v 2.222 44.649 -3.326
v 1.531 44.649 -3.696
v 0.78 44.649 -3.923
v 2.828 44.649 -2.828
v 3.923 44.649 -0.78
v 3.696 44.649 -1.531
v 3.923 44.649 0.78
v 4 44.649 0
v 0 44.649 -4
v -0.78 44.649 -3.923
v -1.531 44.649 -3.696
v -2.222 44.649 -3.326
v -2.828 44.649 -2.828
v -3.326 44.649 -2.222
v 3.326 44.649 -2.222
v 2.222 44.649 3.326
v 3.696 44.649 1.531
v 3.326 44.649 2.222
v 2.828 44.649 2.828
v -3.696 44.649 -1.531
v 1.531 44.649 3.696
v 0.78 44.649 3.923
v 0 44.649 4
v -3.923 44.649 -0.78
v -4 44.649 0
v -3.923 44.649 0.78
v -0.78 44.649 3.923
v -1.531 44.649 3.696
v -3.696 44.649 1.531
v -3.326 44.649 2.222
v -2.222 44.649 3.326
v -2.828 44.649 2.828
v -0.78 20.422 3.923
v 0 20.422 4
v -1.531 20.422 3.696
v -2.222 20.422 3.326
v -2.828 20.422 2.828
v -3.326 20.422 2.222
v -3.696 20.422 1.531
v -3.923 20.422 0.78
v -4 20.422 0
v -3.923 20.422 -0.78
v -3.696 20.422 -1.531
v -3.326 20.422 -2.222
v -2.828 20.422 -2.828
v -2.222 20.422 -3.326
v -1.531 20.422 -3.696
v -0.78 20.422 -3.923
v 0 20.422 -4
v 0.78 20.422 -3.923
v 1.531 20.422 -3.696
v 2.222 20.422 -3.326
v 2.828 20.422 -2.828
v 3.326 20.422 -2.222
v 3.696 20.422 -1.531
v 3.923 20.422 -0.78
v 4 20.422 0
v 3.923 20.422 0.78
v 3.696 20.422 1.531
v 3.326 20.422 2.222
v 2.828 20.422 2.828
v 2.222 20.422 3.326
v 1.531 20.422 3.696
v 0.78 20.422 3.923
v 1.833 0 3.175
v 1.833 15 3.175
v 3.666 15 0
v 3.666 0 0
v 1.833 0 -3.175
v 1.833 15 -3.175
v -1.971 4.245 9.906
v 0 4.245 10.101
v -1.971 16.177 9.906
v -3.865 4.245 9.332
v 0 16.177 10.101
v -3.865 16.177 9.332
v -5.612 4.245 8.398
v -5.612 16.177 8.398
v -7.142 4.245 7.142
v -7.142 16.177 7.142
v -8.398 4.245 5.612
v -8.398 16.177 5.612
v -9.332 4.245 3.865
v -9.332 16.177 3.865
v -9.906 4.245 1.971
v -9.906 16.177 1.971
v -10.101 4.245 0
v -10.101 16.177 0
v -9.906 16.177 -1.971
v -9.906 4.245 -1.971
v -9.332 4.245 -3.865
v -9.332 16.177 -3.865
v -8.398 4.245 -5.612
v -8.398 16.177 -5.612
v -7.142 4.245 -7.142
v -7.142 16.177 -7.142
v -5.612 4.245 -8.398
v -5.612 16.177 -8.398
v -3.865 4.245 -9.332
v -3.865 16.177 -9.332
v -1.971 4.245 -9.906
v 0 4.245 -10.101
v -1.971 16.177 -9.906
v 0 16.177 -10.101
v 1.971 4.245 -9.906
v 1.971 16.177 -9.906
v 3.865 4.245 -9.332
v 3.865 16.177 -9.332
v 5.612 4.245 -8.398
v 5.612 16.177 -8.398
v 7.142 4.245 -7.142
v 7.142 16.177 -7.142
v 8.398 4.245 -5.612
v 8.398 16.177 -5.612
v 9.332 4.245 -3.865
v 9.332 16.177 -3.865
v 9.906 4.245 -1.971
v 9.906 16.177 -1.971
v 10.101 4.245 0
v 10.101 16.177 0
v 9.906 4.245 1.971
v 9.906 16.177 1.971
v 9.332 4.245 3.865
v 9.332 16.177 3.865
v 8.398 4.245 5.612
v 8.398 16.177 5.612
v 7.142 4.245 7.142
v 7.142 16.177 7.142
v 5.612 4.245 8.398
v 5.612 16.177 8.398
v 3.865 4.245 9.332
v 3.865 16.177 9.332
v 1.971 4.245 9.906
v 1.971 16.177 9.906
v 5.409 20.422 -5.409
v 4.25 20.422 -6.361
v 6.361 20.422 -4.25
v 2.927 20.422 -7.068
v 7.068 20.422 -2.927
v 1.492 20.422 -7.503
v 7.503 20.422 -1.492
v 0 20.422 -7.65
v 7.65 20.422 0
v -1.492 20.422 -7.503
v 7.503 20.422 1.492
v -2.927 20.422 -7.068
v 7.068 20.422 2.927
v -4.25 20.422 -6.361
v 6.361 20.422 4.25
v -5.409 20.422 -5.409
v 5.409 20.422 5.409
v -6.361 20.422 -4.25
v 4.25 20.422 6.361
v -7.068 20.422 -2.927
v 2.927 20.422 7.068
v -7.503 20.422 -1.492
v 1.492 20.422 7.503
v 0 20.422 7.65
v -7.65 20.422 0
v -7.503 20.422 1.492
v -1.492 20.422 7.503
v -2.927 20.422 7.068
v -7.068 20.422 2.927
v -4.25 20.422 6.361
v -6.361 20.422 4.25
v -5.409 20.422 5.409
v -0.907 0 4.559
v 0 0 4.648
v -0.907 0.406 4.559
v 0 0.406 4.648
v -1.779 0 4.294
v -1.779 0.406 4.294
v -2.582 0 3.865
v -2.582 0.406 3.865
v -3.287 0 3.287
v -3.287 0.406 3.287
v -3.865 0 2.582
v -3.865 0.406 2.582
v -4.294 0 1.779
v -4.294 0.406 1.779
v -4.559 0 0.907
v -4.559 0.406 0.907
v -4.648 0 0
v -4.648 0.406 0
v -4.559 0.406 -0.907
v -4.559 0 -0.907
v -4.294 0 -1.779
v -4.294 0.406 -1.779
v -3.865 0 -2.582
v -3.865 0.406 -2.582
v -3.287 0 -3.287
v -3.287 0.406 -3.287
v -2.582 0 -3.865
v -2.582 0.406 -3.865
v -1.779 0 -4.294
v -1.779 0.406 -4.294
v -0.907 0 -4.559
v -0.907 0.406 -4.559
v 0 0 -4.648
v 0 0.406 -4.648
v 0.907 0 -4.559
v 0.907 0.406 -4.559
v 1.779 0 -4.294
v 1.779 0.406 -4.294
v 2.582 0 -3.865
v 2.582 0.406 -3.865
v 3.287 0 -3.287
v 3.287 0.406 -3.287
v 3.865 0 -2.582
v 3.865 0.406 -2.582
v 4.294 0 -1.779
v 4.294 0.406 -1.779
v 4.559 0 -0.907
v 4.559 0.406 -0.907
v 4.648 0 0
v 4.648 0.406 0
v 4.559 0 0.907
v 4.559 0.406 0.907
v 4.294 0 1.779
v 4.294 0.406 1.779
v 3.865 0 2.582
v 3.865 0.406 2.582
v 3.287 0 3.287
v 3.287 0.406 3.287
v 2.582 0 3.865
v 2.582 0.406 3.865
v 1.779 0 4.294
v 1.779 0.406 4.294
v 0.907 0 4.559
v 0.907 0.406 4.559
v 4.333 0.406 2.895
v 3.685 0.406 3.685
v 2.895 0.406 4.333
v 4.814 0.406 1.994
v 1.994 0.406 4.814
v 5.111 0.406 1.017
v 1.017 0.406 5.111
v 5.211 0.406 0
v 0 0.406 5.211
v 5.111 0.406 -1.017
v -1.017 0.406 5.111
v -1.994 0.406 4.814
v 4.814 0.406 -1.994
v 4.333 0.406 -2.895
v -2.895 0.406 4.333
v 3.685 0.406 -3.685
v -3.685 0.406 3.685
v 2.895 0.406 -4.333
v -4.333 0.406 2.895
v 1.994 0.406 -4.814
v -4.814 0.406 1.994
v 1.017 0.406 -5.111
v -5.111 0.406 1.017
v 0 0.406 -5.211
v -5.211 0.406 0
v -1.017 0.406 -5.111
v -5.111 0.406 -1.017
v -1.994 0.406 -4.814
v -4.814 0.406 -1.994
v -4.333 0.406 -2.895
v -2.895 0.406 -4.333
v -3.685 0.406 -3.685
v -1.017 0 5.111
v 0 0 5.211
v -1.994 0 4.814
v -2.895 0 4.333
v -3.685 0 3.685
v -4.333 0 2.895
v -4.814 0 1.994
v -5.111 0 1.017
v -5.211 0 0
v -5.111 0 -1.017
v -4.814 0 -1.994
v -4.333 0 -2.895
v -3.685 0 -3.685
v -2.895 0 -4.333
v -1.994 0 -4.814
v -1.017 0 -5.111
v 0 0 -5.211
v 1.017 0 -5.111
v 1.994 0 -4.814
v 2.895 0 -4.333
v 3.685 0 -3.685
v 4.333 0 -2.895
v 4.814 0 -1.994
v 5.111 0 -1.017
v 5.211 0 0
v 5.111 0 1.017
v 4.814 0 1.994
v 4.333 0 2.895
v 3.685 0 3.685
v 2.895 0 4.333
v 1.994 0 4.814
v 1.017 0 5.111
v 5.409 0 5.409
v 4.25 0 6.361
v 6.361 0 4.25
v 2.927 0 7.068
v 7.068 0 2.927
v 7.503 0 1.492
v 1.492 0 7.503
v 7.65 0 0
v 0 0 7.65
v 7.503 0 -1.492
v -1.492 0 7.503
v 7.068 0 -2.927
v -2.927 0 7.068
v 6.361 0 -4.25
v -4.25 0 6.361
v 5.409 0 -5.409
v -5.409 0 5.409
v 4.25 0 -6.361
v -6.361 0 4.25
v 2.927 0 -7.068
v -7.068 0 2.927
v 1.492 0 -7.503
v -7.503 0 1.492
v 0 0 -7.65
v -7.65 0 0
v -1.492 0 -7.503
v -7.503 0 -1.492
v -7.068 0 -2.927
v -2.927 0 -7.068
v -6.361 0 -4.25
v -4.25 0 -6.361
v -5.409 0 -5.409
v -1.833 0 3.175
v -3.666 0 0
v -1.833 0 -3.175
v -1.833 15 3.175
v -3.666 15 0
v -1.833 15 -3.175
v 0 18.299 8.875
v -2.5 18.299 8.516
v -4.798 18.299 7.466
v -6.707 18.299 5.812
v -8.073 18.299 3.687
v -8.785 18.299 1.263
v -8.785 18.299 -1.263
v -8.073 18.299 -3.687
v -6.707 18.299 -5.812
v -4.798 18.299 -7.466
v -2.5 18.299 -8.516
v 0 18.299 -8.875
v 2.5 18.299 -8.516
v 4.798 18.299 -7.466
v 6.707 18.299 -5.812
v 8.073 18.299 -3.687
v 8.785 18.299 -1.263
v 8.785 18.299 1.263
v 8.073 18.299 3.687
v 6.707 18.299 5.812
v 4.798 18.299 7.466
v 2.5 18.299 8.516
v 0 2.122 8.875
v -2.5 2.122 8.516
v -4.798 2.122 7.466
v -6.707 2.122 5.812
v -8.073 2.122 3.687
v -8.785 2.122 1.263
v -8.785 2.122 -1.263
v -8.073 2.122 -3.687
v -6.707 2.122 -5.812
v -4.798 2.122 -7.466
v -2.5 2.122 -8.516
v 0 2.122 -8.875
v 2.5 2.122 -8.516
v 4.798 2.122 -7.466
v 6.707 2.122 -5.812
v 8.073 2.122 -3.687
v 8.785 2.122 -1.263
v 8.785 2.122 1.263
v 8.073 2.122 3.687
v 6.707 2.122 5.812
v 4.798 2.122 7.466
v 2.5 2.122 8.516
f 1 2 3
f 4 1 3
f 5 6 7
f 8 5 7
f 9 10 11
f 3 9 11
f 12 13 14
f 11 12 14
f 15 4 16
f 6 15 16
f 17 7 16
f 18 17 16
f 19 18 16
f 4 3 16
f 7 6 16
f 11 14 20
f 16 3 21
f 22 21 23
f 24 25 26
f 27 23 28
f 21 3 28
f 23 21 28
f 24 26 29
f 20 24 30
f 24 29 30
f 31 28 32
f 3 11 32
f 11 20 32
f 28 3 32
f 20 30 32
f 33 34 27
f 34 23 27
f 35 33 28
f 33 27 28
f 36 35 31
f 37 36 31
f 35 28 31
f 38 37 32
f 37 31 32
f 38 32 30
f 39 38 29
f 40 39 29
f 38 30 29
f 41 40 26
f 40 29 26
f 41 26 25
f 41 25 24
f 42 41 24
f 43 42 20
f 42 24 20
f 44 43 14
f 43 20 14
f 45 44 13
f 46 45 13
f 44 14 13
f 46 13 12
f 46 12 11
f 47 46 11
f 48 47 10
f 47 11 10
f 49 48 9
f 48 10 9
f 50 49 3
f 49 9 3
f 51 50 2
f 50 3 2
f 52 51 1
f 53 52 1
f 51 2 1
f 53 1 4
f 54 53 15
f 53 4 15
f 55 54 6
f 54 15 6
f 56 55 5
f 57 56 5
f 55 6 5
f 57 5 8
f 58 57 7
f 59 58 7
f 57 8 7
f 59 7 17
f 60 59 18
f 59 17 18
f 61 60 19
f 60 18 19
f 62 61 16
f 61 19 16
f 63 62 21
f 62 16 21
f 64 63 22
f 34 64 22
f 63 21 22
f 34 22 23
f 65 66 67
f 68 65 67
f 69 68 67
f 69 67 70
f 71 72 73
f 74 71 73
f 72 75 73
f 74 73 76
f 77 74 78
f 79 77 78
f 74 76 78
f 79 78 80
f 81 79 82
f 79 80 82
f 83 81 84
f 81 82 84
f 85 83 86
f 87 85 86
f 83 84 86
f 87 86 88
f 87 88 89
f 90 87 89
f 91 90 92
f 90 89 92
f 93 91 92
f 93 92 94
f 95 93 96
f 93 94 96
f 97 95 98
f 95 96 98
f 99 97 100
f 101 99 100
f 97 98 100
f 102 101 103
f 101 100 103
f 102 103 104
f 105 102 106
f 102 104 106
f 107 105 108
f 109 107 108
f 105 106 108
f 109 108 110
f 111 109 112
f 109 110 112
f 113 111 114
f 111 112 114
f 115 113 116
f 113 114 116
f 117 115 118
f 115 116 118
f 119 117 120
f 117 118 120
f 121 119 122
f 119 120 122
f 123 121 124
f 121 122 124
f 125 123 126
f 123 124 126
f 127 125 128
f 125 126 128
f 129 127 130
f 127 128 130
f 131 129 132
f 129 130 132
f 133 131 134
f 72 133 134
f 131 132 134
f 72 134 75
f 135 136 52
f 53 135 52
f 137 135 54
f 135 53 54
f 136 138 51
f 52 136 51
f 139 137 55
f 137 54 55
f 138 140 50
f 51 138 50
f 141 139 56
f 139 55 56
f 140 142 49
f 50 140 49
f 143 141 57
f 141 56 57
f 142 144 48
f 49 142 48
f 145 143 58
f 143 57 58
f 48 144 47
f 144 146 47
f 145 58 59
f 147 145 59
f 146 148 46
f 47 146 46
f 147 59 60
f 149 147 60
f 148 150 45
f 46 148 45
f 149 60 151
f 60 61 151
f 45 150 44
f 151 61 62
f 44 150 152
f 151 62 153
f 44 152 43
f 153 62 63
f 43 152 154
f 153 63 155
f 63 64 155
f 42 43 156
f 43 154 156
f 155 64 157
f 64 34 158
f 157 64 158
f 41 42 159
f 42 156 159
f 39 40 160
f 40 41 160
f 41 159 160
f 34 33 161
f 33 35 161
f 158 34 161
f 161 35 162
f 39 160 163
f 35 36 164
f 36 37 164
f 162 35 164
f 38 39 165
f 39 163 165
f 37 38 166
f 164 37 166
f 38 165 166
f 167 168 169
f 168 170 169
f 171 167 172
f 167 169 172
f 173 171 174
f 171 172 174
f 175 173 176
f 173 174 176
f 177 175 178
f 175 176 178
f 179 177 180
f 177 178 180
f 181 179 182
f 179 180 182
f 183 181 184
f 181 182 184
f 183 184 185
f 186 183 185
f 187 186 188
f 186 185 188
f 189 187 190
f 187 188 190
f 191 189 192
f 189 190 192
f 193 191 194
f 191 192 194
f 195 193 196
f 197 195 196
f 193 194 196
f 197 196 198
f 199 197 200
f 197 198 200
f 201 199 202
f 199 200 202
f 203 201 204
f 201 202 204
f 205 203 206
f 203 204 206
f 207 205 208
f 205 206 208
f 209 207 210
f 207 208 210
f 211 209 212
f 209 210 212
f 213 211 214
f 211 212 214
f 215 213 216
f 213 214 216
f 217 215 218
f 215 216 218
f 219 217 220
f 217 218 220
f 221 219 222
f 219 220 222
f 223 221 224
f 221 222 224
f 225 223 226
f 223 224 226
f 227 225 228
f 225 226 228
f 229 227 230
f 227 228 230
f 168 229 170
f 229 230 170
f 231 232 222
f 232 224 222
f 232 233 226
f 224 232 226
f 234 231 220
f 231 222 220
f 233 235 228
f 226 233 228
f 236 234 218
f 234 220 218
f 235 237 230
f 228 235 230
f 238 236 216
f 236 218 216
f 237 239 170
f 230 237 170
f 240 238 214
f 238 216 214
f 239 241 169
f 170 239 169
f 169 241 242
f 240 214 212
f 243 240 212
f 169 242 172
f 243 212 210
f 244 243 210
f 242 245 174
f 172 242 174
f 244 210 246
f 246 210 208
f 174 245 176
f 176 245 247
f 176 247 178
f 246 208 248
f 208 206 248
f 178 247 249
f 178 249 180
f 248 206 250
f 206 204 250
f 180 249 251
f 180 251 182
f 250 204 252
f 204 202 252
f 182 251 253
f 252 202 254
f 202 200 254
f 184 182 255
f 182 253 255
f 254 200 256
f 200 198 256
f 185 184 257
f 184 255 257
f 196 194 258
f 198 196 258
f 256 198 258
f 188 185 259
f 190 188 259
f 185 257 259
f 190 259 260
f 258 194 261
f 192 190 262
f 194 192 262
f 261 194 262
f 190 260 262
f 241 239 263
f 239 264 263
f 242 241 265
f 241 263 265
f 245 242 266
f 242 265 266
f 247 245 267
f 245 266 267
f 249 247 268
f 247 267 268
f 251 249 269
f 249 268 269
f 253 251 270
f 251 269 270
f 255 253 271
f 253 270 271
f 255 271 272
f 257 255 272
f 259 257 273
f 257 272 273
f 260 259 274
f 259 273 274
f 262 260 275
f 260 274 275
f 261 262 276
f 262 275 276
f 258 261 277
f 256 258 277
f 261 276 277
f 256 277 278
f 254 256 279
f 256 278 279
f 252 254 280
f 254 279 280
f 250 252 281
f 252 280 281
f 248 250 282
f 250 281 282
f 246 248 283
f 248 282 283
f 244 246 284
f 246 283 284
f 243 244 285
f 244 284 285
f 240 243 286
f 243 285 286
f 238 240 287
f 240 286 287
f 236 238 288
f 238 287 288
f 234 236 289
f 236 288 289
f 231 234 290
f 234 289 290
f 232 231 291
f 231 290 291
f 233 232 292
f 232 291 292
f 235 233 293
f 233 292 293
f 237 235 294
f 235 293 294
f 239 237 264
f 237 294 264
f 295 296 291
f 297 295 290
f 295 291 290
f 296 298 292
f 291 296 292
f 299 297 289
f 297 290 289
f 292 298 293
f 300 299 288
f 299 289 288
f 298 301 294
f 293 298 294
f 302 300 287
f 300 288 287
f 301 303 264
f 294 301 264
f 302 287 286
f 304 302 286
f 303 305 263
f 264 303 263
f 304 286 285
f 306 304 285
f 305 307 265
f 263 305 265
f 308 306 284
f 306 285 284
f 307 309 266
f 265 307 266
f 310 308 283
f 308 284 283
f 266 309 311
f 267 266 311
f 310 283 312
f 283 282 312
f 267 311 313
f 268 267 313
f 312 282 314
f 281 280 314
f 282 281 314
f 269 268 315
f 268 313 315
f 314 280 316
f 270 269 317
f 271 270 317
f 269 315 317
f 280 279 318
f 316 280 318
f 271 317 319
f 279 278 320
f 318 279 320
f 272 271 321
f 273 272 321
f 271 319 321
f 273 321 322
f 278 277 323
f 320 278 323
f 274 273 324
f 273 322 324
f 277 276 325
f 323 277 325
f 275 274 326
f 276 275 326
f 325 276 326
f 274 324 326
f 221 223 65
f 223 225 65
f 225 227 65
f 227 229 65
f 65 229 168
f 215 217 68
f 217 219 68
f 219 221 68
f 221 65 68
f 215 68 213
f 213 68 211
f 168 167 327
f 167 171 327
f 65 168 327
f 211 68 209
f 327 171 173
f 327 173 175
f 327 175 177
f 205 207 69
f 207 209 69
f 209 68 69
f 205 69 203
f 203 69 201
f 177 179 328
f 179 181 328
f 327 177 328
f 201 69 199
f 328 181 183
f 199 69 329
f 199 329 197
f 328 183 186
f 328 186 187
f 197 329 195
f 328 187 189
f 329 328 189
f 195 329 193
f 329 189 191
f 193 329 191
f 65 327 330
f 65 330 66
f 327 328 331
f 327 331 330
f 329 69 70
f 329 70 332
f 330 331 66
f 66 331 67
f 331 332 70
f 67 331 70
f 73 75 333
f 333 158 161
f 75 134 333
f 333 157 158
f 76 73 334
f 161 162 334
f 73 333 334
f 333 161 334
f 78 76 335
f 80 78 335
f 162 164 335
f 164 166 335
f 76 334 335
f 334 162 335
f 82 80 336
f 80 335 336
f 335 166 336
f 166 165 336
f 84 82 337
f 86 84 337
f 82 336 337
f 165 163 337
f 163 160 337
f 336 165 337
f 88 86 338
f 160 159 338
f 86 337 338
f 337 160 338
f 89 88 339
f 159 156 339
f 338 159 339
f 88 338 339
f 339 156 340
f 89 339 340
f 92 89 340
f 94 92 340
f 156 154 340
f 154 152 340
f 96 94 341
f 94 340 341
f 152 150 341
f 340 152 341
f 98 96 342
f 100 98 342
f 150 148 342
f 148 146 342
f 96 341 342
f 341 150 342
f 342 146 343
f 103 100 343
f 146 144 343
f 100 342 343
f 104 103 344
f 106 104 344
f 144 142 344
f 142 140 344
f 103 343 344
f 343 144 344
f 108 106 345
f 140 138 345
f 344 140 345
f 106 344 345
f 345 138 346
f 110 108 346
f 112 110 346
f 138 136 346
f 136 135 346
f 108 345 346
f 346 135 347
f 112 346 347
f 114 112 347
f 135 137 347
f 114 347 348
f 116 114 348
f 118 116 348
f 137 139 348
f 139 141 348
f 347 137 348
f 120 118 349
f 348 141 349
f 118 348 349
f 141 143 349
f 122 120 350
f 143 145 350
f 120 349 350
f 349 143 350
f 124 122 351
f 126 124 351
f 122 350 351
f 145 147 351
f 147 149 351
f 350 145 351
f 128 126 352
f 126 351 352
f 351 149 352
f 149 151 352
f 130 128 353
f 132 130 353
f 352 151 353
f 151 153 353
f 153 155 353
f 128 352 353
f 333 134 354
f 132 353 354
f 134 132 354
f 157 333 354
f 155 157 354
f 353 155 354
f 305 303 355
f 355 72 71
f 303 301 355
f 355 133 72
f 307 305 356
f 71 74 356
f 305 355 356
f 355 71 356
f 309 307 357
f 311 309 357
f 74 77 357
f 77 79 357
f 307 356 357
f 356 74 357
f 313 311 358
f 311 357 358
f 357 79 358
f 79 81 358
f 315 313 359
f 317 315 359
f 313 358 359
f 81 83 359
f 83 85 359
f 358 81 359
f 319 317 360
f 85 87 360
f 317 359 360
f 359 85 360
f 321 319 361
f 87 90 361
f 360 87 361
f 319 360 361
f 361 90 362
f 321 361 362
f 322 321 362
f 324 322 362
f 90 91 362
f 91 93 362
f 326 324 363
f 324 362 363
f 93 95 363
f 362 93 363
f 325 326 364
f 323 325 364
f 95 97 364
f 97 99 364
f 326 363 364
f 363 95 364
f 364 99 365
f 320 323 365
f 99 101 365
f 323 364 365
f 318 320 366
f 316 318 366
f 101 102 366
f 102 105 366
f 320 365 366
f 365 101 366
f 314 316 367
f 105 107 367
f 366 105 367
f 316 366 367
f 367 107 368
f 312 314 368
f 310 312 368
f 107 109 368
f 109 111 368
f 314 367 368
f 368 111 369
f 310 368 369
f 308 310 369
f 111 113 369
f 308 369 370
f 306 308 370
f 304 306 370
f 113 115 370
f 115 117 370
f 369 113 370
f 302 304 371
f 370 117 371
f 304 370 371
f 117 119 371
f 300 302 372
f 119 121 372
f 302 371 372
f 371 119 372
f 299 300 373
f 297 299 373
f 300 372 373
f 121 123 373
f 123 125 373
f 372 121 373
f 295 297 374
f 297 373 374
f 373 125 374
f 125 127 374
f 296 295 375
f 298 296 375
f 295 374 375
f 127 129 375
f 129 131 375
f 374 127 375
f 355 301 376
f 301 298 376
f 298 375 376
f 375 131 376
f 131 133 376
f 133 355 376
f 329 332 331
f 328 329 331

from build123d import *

# Parameters (mm, degrees)
CUT_EXTRUDE1_DEPTH = 15
SKETCH5_OUTSIDE_W  = 38.178
SKETCH5_OUTSIDE_H  = 38.178
CUT_EXTRUDE4_DEPTH = 48.97402978


# Read off the part's stored shape, not the designer's step: Save Bodies1
with BuildPart() as part:
    # Sketch3 → Revolve1 (revolve)
    with BuildSketch(Plane.XY, mode=Mode.PRIVATE) as revolve1_sk:
        Polygon((0, 0), (-4.648047108, 0), (-4.648047108, 0.405570897), (-5.210688758, 0.405570897), (-5.210688758, 0), (-7.649820617, 0), (-10.100522132, 4.244739538), (-10.100522132, 16.176790493), (-7.649820617, 20.42153003), (-4, 20.42153003), (-4, 44.648637254), (0, 44.648637254), align=None)
    revolve(revolve1_sk.sketch.rotate(Axis((0, 44.648637254, 0), (0, -1, 0)), 270), axis=Axis((0, 44.648637254, 0), (0, -1, 0)))

    # Sketch2 → Cut-Extrude1 (cut)
    with BuildSketch(Plane(origin=(0, 0, 0), x_dir=(1, 0, 0), z_dir=(0, 1, 0))):
        Polygon((3.666174209, 0), (1.833087105, 3.175), (-1.833087105, 3.175), (-3.666174209, 0), (-1.833087105, -3.175), (1.833087105, -3.175), align=None)
    extrude(amount=CUT_EXTRUDE1_DEPTH, mode=Mode.SUBTRACT)


with BuildPart() as body_2:
    # Sketch4 → Revolve2 (revolve)
    with BuildSketch(Plane.XY, mode=Mode.PRIVATE) as revolve2_sk:
        with BuildLine():
            Line((10.100522132, 16.176790493), (10.100522132, 4.244739538))
            Line((10.100522132, 4.244739538), (10.600522132, 4.244739538))
            ThreePointArc((10.600522132, 4.244739538), (12.409809018, 10.210765015), (10.600522132, 16.176790493))
            Line((10.600522132, 16.176790493), (10.100522132, 16.176790493))
        make_face()
    revolve(revolve2_sk.sketch.rotate(Axis((0, 44.648637254, 0), (0, -1, 0)), 90), axis=Axis((0, 44.648637254, 0), (0, -1, 0)))

    # Sketch5 outside → Cut-Extrude4 (cut, through all)
    with BuildSketch(Plane(origin=(0, 0, 0), x_dir=(1, 0, 0), z_dir=(0, 1, 0))):
        Rectangle(SKETCH5_OUTSIDE_W, SKETCH5_OUTSIDE_H)
        Polygon((-0.056367181, 11.203062871), (-5.650346846, 9.673953456), (-9.730320636, 5.552716025), (-11.203062871, -0.056367181), (-9.673953456, -5.650346846), (-5.552716025, -9.730320636), (0.056367181, -11.203062871), (5.650346846, -9.673953456), (9.730320636, -5.552716025), (11.203062871, 0.056367181), (9.673953456, 5.650346846), (5.552716025, 9.730320636), align=None, mode=Mode.SUBTRACT)
    extrude(amount=CUT_EXTRUDE4_DEPTH, mode=Mode.SUBTRACT)


solid = part.part
